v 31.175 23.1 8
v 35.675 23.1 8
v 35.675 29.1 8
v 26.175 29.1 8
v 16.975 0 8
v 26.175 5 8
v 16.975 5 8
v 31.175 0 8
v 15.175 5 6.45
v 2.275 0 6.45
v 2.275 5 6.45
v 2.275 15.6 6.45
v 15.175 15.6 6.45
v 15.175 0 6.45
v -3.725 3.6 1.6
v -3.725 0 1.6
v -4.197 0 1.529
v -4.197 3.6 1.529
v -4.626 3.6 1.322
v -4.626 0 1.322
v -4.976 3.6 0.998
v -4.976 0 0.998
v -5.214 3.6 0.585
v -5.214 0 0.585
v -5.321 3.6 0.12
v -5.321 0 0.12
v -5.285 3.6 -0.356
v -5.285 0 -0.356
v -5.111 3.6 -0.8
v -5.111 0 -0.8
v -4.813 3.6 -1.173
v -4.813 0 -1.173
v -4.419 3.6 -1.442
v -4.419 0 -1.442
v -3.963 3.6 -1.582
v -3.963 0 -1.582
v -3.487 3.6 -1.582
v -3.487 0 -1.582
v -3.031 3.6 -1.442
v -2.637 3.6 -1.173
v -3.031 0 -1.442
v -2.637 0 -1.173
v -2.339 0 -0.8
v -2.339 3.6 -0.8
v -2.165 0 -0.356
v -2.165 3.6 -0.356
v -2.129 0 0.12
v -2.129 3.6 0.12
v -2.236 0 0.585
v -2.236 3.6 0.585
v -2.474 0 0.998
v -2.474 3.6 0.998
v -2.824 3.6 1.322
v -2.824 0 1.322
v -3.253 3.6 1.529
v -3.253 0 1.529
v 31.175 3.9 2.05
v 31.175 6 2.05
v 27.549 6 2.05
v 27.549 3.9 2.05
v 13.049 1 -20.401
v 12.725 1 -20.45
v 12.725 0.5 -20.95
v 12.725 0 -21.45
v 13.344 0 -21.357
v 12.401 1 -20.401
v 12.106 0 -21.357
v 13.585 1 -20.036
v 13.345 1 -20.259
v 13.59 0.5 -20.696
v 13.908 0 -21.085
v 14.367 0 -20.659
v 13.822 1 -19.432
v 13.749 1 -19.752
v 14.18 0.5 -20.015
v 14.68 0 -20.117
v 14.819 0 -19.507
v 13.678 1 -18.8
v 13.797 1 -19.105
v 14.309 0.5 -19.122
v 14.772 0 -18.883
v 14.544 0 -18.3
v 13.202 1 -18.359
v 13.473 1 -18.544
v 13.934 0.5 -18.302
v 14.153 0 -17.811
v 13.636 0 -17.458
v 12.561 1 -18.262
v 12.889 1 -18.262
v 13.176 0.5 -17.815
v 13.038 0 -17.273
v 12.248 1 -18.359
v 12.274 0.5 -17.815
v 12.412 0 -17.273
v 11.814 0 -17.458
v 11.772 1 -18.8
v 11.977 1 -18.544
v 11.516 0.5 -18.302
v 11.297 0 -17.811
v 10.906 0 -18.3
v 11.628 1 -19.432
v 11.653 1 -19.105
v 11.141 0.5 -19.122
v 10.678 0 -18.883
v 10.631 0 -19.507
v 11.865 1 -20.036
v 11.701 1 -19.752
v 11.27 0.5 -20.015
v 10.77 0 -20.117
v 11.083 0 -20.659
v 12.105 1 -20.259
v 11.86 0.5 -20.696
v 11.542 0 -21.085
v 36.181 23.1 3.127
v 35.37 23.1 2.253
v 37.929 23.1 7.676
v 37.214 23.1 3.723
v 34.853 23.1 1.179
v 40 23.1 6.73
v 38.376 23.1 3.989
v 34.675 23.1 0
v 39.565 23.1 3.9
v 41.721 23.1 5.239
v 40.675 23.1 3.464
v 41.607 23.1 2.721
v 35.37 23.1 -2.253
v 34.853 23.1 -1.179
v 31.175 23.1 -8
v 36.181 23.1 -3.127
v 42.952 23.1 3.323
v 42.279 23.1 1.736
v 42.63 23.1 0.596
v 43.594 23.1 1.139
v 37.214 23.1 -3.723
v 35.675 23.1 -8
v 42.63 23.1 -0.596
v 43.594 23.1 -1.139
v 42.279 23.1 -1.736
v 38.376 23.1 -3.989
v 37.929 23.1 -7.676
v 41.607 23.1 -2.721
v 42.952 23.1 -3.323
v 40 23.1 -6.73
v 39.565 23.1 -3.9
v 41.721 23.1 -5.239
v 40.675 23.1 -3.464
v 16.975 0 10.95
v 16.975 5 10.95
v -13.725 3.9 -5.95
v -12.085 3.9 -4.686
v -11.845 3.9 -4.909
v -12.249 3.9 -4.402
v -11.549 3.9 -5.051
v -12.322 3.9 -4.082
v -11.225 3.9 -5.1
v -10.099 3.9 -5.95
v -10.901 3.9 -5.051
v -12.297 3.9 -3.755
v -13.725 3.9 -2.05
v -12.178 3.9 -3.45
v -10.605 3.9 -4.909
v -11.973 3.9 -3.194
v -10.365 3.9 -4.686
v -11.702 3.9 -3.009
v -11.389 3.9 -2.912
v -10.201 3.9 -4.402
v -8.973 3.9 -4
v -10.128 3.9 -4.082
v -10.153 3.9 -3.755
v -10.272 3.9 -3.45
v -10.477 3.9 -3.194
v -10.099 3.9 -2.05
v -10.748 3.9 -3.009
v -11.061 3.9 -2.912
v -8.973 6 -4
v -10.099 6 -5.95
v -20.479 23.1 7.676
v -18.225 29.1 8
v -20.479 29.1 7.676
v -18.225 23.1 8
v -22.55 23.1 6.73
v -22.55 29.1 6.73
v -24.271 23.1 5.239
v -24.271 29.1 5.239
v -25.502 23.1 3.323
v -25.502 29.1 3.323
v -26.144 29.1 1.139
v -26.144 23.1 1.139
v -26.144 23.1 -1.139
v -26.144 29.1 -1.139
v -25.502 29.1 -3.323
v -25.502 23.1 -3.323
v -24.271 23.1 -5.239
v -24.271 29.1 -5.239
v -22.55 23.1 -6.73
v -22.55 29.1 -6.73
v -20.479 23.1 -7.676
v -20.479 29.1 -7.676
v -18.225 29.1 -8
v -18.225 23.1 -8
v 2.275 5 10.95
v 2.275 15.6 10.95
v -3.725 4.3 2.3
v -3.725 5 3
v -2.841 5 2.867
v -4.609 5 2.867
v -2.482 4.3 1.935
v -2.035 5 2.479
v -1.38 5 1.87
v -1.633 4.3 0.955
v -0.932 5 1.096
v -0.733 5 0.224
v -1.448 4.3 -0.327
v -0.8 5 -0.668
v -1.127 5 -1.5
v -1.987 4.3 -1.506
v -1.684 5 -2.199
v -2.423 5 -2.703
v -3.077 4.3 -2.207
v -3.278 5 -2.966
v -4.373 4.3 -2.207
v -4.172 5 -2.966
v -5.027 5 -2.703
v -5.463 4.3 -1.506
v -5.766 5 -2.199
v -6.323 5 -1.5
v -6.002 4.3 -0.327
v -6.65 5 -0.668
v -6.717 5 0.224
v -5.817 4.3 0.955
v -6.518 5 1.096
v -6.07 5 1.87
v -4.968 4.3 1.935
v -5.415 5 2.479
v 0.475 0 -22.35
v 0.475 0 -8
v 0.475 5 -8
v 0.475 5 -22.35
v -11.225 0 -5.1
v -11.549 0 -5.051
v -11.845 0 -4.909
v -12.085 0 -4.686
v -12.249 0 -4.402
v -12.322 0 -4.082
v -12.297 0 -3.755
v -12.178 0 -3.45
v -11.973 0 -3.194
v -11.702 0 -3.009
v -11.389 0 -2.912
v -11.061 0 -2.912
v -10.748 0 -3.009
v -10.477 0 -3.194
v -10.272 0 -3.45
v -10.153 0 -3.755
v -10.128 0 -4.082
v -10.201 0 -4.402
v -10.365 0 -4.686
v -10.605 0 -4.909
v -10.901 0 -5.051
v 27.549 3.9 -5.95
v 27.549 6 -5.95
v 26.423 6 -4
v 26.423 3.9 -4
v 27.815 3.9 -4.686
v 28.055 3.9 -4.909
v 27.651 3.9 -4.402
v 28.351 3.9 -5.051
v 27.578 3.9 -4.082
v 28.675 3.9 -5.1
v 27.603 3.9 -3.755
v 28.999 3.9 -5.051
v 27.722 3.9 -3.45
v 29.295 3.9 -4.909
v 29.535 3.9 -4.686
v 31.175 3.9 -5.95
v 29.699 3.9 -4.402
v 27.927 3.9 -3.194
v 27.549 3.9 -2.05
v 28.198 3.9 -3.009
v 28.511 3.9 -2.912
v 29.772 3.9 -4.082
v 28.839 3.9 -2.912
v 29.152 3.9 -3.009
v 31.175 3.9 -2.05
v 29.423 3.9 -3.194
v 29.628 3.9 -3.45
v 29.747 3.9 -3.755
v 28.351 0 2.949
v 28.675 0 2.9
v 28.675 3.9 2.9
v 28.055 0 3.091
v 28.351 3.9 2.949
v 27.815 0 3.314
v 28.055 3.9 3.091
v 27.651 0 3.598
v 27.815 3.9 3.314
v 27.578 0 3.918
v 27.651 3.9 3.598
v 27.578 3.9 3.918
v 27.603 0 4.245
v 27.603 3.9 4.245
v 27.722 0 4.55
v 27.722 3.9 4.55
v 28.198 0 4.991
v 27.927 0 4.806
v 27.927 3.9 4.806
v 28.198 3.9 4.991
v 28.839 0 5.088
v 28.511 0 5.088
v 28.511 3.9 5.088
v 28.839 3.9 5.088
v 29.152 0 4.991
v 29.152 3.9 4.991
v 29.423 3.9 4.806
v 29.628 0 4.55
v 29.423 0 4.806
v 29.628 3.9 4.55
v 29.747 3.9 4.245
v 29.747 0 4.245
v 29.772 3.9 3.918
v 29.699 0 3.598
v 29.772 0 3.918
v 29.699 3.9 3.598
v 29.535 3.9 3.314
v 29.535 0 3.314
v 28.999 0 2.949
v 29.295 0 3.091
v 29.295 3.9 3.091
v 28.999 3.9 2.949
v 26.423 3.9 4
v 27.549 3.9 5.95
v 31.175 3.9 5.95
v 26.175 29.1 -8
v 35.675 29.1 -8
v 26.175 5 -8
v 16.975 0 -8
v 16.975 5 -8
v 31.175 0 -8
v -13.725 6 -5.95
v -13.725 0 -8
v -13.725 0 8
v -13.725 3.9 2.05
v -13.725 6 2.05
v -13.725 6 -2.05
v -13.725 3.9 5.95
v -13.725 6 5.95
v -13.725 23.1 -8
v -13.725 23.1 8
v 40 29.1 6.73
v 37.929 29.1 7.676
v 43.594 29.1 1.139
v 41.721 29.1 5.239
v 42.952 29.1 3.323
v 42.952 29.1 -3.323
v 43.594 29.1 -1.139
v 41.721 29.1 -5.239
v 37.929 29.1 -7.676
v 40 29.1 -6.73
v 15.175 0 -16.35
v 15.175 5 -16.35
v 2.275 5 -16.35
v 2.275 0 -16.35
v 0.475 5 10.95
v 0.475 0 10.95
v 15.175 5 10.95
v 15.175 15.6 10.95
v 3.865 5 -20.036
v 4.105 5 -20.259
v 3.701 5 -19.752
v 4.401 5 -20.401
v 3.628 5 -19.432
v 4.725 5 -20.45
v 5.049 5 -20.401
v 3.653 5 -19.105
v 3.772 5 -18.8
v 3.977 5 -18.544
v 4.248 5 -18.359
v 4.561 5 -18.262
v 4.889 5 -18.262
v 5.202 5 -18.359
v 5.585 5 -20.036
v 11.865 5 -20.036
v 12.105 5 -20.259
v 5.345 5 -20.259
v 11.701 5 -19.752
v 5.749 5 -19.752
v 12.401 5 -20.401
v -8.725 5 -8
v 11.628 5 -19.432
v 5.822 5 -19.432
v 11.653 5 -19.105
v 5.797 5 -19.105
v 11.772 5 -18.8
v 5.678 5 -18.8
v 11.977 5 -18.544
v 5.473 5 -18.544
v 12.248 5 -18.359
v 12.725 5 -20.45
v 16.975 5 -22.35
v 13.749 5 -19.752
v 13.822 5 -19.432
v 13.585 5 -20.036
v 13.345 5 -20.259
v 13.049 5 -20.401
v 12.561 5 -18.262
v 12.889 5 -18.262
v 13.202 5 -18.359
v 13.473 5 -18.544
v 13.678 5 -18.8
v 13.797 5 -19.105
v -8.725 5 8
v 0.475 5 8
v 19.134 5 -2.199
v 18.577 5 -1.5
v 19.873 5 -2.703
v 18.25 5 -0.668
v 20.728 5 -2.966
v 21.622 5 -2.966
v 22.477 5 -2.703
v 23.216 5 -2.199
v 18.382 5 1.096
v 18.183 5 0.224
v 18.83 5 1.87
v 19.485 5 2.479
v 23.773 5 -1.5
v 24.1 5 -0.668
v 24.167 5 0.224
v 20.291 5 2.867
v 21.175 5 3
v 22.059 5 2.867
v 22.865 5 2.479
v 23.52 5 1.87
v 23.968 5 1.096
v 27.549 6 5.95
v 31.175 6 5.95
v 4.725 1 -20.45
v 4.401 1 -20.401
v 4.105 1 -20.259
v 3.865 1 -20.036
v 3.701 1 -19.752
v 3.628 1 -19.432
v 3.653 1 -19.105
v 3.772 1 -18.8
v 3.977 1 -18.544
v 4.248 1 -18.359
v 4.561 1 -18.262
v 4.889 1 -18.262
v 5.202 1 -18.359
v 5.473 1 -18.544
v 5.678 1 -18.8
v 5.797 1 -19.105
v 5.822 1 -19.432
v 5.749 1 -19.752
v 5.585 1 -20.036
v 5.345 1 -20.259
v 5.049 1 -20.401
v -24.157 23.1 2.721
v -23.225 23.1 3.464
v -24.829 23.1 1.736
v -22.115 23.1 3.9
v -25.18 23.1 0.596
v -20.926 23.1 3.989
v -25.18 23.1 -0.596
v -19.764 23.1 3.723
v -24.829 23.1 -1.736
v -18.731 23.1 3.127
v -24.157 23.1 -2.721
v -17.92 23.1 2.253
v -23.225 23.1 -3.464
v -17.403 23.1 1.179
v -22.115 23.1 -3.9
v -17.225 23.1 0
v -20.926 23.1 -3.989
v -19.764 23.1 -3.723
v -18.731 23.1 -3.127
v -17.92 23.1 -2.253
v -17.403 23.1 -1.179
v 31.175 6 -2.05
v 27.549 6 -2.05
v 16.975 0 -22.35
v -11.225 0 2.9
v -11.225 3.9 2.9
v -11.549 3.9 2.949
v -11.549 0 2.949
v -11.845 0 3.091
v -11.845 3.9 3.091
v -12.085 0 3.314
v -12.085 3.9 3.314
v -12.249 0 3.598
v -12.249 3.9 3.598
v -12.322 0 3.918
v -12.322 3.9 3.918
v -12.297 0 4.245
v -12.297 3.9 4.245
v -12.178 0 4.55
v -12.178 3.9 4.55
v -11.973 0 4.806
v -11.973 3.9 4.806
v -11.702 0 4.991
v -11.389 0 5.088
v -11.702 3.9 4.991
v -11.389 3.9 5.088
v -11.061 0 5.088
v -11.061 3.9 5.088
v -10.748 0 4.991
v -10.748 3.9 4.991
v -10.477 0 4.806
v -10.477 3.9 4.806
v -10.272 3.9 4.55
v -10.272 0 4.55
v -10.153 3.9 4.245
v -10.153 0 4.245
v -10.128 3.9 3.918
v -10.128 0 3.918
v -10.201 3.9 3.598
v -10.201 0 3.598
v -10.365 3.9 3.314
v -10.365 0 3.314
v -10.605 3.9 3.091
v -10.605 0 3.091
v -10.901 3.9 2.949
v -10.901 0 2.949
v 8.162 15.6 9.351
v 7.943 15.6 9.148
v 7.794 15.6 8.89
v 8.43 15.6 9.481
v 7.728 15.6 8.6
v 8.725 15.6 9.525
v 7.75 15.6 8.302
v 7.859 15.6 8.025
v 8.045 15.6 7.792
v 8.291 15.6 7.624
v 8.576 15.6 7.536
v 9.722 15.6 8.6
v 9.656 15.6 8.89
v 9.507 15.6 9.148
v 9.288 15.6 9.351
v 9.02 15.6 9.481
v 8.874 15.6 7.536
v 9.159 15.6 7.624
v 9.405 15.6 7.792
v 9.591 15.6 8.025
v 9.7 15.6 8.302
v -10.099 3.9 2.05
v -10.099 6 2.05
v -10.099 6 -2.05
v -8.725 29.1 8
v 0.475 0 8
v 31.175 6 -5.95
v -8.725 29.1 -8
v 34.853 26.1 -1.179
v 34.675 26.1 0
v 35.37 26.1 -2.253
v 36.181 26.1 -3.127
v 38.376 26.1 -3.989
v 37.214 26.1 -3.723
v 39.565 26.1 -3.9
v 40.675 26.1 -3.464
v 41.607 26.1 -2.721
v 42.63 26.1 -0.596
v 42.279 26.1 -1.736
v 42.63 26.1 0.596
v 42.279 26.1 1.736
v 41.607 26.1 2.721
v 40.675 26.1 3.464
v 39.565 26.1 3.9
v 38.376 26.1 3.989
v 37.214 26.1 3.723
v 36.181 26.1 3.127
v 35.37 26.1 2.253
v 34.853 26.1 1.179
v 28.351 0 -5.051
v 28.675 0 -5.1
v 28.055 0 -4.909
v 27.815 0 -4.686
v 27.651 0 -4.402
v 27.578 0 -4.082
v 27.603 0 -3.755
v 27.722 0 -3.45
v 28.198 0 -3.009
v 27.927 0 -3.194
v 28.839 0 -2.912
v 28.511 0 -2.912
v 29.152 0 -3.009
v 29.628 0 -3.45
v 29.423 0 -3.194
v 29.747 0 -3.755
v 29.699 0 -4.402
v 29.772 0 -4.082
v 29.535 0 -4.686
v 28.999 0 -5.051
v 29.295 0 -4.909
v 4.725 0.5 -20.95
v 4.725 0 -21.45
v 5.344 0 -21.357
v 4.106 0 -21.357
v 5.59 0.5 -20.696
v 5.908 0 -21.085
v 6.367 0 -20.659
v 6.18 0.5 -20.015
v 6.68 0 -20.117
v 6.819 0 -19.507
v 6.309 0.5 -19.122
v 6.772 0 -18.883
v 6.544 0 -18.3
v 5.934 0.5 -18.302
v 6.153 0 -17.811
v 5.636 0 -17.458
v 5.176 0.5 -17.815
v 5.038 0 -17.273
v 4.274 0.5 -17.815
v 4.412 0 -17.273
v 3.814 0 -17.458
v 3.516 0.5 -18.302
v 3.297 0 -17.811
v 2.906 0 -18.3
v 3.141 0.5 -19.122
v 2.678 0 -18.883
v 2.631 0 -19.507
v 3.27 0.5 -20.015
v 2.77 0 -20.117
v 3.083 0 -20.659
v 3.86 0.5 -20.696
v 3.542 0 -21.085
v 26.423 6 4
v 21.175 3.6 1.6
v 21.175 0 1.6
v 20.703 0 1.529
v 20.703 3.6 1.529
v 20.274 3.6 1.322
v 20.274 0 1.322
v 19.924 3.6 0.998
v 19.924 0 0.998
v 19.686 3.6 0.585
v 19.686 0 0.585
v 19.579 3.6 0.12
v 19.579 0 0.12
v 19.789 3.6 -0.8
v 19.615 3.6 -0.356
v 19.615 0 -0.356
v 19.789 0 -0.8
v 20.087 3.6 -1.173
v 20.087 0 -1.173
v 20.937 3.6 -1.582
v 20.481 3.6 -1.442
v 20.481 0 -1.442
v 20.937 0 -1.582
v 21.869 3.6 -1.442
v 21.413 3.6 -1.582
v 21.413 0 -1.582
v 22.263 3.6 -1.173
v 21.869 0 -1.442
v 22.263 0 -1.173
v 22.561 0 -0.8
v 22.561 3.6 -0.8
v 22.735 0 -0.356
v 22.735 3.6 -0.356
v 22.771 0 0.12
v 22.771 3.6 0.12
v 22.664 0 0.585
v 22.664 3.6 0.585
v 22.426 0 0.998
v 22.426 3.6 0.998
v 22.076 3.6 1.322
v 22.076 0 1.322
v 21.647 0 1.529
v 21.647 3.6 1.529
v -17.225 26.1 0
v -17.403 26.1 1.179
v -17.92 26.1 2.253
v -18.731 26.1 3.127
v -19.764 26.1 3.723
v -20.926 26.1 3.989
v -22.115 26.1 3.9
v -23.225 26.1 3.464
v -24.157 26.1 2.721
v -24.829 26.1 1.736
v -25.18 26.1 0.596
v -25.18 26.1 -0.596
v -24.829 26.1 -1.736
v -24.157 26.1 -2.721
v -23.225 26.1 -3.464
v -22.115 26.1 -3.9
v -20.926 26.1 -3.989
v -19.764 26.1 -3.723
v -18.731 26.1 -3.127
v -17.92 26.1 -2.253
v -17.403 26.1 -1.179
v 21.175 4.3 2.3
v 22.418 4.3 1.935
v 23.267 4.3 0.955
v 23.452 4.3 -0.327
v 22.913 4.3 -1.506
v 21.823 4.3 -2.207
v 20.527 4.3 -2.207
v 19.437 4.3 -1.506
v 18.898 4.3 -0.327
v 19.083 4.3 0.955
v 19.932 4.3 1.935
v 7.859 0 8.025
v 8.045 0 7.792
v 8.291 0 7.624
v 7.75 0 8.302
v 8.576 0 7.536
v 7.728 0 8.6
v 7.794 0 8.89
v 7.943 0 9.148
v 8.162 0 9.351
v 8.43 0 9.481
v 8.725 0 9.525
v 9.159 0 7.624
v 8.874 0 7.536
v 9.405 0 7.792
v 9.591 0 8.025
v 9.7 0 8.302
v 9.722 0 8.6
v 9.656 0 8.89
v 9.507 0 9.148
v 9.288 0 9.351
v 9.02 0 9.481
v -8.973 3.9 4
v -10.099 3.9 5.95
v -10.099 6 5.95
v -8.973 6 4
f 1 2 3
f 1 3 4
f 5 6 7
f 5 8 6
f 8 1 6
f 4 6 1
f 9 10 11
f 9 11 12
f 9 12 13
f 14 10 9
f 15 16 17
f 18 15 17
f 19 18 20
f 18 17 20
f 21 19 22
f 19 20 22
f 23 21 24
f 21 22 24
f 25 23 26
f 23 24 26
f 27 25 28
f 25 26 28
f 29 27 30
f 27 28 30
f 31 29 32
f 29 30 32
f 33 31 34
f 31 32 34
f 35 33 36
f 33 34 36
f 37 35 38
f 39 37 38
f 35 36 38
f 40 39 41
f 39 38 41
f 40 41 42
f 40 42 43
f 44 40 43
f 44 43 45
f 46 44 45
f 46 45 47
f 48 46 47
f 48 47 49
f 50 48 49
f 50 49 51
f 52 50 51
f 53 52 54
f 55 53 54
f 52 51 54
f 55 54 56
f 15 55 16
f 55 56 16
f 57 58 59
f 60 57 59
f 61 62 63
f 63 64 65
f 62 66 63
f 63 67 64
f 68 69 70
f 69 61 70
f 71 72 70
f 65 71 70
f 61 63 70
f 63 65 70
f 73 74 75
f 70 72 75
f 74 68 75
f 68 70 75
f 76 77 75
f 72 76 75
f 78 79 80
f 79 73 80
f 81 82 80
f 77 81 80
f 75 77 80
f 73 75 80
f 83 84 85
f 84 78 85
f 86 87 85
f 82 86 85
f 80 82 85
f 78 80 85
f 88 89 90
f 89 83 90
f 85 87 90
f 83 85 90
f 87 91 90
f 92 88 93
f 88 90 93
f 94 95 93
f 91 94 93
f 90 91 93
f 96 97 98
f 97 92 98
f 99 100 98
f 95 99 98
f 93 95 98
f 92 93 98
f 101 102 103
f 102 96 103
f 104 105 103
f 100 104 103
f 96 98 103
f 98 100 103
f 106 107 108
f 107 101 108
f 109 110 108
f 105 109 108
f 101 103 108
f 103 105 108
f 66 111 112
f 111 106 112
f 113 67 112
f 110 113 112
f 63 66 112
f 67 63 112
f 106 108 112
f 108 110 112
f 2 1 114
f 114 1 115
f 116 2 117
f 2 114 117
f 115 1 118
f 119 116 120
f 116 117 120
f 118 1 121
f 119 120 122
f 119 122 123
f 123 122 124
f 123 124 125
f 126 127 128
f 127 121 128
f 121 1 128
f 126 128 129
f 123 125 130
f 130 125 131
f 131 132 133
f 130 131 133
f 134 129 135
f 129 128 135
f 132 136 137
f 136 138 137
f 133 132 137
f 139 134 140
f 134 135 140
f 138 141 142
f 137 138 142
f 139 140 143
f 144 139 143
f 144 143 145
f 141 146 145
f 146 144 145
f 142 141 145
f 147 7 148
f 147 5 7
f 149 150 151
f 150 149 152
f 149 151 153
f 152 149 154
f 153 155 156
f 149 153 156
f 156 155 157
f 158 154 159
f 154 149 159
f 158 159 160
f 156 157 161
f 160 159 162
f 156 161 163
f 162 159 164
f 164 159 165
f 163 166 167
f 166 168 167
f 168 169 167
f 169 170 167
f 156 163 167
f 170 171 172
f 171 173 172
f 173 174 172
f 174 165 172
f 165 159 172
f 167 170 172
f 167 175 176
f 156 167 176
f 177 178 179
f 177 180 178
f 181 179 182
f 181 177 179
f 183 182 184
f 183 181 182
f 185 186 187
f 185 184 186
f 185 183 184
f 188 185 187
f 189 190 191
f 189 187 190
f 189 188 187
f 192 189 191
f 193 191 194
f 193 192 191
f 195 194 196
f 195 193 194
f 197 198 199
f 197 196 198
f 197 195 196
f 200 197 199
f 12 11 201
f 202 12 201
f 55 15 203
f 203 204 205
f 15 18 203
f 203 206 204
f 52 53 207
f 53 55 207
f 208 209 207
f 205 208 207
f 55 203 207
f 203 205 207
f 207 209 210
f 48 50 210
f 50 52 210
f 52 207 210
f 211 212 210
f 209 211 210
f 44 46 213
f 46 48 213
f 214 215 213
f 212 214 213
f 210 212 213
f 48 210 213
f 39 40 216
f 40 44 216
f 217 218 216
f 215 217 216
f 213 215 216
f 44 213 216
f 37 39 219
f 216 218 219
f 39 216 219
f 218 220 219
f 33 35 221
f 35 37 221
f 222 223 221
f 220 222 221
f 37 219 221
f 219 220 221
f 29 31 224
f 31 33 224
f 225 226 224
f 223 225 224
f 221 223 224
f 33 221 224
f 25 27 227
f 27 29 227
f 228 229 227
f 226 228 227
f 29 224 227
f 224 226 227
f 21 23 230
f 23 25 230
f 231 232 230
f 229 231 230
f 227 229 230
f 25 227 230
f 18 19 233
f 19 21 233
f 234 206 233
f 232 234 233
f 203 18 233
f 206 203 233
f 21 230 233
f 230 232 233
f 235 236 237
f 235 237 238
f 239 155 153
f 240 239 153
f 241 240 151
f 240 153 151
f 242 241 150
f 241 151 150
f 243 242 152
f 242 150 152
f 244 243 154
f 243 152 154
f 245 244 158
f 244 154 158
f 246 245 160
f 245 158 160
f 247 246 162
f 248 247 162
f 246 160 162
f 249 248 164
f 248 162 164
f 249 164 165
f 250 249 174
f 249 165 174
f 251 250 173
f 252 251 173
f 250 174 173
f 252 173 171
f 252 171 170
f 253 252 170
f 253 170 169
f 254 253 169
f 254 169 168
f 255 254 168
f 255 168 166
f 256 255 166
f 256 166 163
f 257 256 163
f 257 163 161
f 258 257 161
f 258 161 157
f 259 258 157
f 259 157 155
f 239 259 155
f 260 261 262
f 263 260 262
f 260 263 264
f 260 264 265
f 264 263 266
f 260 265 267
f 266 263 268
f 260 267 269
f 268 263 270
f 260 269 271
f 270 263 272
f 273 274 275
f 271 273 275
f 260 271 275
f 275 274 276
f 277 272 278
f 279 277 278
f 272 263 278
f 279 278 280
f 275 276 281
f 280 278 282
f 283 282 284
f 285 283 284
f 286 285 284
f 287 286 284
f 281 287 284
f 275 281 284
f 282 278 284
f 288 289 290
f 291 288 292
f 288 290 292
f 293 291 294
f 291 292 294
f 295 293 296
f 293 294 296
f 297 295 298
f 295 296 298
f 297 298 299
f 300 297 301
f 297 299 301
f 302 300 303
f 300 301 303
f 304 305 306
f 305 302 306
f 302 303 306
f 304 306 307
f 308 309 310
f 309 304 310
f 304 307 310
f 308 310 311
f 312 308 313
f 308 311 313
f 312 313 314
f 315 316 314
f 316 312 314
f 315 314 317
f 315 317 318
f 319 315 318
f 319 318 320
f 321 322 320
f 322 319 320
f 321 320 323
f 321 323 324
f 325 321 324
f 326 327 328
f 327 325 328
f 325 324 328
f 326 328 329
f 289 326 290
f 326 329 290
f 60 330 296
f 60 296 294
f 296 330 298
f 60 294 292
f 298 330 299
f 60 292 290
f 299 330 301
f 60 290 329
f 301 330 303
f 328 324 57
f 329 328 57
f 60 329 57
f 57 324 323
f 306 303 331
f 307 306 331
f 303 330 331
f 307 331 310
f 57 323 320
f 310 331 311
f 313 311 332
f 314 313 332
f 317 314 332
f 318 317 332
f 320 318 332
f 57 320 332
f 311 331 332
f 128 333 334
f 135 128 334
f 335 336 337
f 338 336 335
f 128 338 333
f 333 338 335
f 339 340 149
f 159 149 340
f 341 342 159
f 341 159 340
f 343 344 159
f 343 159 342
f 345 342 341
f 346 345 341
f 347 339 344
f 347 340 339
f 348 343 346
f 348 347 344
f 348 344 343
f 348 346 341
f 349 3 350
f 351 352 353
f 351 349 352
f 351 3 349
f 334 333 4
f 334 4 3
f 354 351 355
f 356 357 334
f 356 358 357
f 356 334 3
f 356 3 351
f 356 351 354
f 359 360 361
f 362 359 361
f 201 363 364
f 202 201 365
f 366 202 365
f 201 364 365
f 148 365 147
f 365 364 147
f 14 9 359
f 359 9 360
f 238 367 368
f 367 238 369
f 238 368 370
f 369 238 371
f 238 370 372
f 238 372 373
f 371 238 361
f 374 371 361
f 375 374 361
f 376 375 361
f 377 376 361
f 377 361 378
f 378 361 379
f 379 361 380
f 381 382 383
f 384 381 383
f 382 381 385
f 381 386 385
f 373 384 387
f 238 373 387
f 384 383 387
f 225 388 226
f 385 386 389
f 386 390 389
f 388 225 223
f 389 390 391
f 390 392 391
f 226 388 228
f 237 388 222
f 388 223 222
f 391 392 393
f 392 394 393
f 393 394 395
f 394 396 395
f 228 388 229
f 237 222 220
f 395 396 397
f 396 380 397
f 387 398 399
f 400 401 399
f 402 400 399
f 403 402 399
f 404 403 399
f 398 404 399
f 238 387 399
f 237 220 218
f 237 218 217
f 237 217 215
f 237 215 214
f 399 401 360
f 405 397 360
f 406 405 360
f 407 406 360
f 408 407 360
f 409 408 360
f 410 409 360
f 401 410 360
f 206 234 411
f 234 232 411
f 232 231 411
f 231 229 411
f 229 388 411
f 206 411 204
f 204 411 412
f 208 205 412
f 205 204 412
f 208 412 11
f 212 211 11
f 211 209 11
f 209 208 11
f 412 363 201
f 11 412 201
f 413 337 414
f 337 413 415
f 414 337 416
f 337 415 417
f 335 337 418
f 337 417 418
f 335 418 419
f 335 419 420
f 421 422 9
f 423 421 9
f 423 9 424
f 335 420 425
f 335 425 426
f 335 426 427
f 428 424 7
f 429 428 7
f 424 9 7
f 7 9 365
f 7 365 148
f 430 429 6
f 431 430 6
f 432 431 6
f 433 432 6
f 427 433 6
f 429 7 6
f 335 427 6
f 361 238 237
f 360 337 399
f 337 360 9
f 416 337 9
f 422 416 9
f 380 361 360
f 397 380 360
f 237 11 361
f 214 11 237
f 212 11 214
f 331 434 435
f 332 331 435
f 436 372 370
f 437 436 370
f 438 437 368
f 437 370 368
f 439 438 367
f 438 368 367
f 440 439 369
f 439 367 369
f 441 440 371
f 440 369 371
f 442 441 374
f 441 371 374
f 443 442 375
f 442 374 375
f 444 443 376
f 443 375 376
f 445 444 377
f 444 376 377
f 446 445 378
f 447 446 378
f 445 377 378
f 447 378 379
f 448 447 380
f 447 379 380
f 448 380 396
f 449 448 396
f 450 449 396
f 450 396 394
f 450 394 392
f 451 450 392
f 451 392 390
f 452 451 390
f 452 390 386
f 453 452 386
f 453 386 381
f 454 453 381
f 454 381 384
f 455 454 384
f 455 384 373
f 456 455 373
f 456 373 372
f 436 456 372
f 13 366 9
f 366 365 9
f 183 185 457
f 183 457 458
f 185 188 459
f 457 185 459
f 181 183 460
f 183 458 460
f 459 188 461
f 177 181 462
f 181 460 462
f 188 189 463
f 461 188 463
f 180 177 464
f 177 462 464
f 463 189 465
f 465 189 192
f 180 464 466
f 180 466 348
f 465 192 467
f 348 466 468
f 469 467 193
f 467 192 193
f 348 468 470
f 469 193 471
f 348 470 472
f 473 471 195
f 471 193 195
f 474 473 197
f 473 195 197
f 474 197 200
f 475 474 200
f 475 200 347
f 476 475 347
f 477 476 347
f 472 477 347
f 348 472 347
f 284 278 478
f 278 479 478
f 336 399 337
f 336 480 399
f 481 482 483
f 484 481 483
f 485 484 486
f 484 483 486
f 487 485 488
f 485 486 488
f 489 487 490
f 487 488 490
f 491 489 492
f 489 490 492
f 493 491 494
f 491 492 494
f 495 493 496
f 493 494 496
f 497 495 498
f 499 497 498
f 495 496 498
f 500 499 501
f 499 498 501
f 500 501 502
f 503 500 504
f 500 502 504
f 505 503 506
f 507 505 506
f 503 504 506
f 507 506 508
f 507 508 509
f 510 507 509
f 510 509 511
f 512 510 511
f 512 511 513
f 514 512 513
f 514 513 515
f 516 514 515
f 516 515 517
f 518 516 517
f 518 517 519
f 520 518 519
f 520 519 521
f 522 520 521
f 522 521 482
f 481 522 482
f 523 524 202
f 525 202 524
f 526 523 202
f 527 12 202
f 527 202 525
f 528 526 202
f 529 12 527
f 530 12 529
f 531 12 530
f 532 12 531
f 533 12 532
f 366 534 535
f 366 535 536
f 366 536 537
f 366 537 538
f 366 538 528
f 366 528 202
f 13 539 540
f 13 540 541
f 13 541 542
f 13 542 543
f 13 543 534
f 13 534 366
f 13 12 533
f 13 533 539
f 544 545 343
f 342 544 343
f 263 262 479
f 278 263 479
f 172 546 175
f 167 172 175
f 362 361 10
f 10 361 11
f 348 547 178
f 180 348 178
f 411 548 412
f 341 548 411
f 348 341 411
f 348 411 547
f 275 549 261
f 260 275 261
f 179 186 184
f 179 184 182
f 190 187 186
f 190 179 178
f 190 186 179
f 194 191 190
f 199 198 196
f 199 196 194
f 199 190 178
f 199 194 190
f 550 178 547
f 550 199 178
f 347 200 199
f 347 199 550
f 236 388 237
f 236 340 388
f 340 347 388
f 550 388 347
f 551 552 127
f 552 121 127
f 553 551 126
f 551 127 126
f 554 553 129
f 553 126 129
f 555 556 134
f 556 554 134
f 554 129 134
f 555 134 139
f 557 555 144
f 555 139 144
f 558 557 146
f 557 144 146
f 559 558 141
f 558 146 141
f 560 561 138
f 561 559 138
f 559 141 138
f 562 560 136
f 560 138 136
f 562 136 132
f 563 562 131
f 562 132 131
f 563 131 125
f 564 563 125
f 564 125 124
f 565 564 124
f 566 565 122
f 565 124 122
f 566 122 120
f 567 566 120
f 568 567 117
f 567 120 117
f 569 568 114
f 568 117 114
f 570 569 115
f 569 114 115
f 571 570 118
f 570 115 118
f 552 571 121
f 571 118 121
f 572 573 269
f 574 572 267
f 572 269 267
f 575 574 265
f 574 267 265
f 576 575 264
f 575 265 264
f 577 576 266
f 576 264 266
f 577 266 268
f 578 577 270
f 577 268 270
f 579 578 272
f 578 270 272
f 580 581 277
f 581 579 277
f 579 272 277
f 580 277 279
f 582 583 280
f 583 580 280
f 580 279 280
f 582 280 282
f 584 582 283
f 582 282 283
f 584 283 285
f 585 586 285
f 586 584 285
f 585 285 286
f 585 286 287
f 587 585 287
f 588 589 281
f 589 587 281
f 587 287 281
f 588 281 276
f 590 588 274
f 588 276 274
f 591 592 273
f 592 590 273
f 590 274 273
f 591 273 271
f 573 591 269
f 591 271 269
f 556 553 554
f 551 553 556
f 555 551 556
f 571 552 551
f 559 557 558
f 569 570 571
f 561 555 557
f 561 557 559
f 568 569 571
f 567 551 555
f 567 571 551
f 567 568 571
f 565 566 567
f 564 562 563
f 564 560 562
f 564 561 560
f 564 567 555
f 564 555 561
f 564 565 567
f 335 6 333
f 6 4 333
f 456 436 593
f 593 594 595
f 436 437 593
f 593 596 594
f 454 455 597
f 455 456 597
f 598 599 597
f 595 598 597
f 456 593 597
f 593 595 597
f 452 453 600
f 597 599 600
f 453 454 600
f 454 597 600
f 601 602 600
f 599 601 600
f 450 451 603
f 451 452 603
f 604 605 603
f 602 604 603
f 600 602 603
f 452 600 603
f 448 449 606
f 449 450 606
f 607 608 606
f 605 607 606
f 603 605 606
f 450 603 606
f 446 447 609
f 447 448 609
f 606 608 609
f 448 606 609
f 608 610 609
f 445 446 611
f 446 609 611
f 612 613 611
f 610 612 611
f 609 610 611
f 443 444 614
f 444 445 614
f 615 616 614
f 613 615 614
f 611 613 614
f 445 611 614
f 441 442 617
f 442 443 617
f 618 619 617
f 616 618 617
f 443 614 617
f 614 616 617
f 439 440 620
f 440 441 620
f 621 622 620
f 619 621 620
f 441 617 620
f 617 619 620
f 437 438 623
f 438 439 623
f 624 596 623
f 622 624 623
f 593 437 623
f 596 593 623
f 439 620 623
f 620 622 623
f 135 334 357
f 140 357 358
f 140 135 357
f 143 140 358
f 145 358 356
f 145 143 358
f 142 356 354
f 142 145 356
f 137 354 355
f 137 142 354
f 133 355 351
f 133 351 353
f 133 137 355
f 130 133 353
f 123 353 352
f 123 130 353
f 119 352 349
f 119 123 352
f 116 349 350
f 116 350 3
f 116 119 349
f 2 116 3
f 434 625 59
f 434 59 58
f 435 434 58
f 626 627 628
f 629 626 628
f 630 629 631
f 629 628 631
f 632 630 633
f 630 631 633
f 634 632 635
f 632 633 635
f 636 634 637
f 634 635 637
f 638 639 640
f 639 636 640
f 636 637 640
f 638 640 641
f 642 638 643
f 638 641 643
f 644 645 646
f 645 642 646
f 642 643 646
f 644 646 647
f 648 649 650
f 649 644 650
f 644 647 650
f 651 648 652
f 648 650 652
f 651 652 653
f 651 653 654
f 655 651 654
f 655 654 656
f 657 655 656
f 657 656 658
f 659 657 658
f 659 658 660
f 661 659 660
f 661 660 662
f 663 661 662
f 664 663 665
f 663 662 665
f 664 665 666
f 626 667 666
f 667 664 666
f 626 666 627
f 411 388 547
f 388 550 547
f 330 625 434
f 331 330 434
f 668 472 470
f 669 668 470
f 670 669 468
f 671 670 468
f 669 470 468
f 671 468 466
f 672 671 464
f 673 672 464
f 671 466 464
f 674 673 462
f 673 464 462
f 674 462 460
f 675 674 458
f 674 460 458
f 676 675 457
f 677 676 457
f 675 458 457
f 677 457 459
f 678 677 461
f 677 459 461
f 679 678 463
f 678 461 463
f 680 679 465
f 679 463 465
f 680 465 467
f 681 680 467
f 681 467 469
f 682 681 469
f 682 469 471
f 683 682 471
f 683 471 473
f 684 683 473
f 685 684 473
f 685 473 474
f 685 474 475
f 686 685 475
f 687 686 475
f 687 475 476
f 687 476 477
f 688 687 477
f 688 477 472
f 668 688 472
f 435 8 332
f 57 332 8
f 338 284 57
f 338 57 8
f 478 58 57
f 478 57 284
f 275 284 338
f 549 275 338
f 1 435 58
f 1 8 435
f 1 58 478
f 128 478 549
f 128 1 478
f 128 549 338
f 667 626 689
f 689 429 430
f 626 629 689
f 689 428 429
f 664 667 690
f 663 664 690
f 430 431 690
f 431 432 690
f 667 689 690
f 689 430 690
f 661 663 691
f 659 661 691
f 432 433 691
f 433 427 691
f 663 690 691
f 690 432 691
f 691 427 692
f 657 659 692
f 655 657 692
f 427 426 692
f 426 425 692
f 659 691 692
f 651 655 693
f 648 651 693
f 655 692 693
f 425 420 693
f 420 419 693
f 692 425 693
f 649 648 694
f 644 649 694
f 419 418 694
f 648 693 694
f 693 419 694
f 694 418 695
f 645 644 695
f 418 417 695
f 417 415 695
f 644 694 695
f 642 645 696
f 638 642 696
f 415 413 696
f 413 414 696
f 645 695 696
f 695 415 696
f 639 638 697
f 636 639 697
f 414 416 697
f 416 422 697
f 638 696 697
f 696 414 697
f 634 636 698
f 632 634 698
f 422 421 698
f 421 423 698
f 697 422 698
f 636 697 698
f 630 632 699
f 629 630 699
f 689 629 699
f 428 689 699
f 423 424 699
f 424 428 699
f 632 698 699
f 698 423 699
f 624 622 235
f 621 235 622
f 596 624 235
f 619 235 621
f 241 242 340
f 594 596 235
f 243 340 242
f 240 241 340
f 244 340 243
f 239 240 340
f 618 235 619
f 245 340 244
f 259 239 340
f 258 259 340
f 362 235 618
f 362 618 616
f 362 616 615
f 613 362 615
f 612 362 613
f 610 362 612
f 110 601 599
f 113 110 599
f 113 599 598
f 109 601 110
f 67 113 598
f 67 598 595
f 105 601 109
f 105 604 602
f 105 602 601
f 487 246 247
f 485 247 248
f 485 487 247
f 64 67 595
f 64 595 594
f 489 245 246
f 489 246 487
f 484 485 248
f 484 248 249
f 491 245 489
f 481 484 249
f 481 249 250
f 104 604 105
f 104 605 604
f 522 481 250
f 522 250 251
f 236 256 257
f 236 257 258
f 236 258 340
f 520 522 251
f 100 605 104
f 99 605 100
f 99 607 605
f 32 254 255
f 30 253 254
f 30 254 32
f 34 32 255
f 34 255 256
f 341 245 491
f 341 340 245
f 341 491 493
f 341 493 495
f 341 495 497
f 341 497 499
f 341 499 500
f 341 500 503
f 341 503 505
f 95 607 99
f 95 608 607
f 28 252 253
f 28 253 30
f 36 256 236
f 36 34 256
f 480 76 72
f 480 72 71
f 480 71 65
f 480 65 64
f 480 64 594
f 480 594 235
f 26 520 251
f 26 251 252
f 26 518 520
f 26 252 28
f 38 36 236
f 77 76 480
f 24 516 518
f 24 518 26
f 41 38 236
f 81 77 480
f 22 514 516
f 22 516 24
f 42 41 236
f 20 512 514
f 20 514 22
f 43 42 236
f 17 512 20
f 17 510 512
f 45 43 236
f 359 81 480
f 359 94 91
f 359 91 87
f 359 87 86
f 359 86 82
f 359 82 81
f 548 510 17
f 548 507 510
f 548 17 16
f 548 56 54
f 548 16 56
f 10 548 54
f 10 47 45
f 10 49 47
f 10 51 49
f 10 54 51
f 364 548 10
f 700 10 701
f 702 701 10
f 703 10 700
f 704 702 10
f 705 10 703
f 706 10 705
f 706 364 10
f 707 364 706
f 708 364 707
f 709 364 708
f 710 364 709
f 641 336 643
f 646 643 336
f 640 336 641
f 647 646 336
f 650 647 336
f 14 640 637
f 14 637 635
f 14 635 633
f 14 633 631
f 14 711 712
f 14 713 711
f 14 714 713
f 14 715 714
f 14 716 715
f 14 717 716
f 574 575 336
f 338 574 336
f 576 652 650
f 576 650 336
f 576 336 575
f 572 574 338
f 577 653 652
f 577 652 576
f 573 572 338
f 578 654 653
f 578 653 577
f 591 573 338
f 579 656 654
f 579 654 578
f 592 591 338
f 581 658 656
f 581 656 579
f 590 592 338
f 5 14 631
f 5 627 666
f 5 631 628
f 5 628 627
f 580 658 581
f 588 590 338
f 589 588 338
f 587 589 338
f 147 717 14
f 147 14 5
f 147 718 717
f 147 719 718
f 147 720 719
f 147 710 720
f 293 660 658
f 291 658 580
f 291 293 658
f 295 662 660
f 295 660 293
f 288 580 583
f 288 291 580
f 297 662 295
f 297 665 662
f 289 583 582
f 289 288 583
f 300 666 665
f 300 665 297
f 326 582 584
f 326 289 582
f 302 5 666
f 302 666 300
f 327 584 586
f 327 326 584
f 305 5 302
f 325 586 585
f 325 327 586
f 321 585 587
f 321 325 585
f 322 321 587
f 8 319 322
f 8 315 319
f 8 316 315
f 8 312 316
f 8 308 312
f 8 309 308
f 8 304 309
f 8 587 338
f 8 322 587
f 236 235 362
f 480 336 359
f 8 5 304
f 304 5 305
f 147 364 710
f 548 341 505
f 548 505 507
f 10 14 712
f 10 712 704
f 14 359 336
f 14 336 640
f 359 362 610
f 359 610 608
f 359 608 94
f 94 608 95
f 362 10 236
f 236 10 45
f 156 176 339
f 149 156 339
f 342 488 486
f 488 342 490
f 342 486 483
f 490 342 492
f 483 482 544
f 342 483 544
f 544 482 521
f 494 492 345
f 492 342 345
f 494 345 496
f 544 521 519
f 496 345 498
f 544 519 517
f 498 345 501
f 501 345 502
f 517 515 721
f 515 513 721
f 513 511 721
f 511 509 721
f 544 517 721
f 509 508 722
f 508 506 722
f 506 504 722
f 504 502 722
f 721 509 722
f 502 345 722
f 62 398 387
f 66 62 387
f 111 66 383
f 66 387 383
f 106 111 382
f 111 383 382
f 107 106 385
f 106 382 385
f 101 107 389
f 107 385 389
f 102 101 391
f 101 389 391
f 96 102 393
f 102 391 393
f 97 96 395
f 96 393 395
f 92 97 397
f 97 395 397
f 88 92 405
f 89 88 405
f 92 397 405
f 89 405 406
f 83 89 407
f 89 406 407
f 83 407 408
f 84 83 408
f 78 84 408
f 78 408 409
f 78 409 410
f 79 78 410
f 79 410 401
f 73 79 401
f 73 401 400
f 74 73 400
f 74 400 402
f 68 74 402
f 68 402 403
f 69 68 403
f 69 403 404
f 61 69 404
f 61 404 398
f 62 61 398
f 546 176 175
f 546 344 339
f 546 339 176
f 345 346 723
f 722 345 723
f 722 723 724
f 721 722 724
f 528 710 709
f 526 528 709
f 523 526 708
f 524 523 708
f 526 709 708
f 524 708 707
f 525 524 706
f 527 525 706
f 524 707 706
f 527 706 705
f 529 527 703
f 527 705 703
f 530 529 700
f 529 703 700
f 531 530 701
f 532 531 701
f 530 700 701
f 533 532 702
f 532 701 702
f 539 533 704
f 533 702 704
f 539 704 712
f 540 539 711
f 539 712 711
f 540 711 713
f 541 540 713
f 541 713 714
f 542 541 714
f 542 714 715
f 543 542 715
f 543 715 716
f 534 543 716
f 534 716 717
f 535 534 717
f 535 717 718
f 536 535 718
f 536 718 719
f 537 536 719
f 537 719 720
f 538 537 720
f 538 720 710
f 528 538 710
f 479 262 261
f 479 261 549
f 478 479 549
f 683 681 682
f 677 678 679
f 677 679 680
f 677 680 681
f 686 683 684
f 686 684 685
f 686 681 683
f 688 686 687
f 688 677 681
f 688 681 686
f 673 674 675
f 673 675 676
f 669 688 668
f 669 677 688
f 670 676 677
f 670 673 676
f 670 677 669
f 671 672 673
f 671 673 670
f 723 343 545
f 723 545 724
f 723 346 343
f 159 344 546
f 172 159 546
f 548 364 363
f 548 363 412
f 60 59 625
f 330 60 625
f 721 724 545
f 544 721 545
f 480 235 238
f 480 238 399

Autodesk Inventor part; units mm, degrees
ref_plane "YZ Plane" through (0, 0, 0) normal (1, 0, 0) x (0, 1, 0)
ref_plane "XZ Plane" through (0, 0, 0) normal (0, 1, 0) x (-1, 0, 0)
ref_plane "XY Plane" through (0, 0, 0) normal (0, 0, 1) x (1, 0, 0)
sketch "Эскиз1" plane through (0, 0, 0) normal (0, 1, 0) x (-1, 0, 0)
  line L0 (-8.725, 8) -> (8.725, 8)
  line L1 (8.725, 8) -> (8.725, -8)
  line L2 (8.725, -8) -> (-8.725, -8)
  line L3 (-8.725, -8) -> (-8.725, 8)
  line L4 (-8.725, 8) -> (8.725, -8) construction
  line L5 (8.725, 8) -> (-8.725, -8) construction
  point P0 (0, 0)
  dimension "d0" = 17.45
  dimension "d1" = 16
extrude "Выдавливание1" add sketch "Эскиз1" along normal blind 5
sketch "Эскиз2" plane through (-8.725, 0, -8) normal (-1, 0, 0) x (0, 0, 1)
  line L0 (0, 23.1) -> (16, 23.1)
  line L1 (16, 23.1) -> (16, 0)
  line L2 (16, 0) -> (0, 0)
  line L3 (0, 0) -> (0, 23.1)
  line L4 (16, 0) -> (16, 5) projected
  line L5 (0, 0) -> (0, 5) projected
  line L6 (0, 0) -> (16, 0) projected
  line L7 (0, 5) -> (16, 5) projected
  point P0 (8, 0)
  dimension "d5" = 18.1
extrude "Выдавливание2" add sketch "Эскиз2" along normal blind 5
sketch "Эскиз3" plane through (-8.725, 23.1, 8) normal (0, 1, 0) x (1, 0, 0)
  line L0 (0, 16) -> (-17.5, 16)
  line L1 (-17.5, 16) -> (-17.5, 0)
  line L2 (-17.5, 0) -> (0, 0)
  line L3 (0, 0) -> (0, 16)
  line L4 (0, 0) -> (-5, 0) projected
  circle A0 centre (-9.5, 8) radius 8
  line L5 (-5, 0) -> (-5, 16) projected
  point P0 (-9.5, 16)
  point P1 (-9.5, 0)
  point P2 (-5, 8)
  dimension "d49" = 4.5
extrude "Выдавливание3" add sketch "Эскиз3" along normal blind 6 contours L3 L2 L5 A0 L0 | L5 A0 L0 | A0 L5 | A0 L5 | L2 A0 L5
sketch "Эскиз7" plane through (0, 0, 0) normal (0, -1, 0) x (1, 0, 0)
  line L0 (-8.725, -8) -> (-8.725, 8) construction
  line L1 (-8.725, 8) -> (-8.725, -8) construction
  line L2 (-13.725, 8) -> (-13.725, -8) construction
  line L3 (-8.725, -8) -> (-13.725, -8) construction
  line L4 (-13.725, -8) -> (-13.725, 8) construction
  line L5 (-13.725, 8) -> (-8.725, 8) construction
  line L6 (-8.725, 8) -> (-8.725, -8) construction
  line L7 (-13.725, -8) -> (-13.725, 8) projected
  line L8 (-13.725, 0) -> (-8.725, 0) construction
  line L9 (-11.225, -4) -> (-11.225, 4)
  point P0 (0, 0)
  point P1 (-11.225, 0)
  dimension "d34" = 8
hole "Отверстие3" at (-11.225, 0, -4) at (-11.225, 0, 4) direction (0, 1, 0) diameter 2.2 depth 6
sketch "Эскиз8" plane through (0, 0, 0) normal (0, -1, 0) x (1, 0, 0)
  circle A0 centre (-11.225, -4) radius 1.1 projected
  line L0 (-13.4767, -4) -> (-12.3508, -2.05) construction
  line L1 (-12.3508, -2.05) -> (-10.0992, -2.05)
  line L2 (-10.0992, -2.05) -> (-8.9733, -4)
  line L3 (-8.9733, -4) -> (-10.0992, -5.95)
  line L4 (-10.0992, -5.95) -> (-12.3508, -5.95)
  line L5 (-12.3508, -5.95) -> (-13.4767, -4) construction
  circle A1 centre (-11.225, 4) radius 1.1 projected
  line L6 (-13.4767, 4) -> (-12.3508, 5.95) construction
  line L7 (-12.3508, 5.95) -> (-10.0992, 5.95)
  line L8 (-10.0992, 5.95) -> (-8.9733, 4)
  line L9 (-8.9733, 4) -> (-10.0992, 2.05)
  line L10 (-10.0992, 2.05) -> (-12.3508, 2.05)
  line L11 (-12.3508, 2.05) -> (-13.4767, 4) construction
  line L12 (-13.725, -8) -> (-13.725, 8) projected
  line L13 (-12.3508, -5.95) -> (-13.725, -5.95)
  line L14 (-13.725, -5.95) -> (-13.725, -2.05)
  line L15 (-13.725, -2.05) -> (-12.3508, -2.05)
  line L16 (-12.3508, -2.05) -> (-12.3508, -5.95) construction
  line L17 (-12.3508, 2.05) -> (-13.725, 2.05)
  line L18 (-13.725, 2.05) -> (-13.725, 5.95)
  line L19 (-13.725, 5.95) -> (-12.3508, 5.95)
  line L20 (-12.3508, 5.95) -> (-12.3508, 2.05) construction
  point P0 (0, 0)
  dimension "d42" = 3.9
extrude "Выдавливание5" cut sketch "Эскиз8" along normal blind 2.1 from surface at -6
sketch "Эскиз4" plane through (-8.725, 23.1, 8) normal (0, -1, 0) x (1, 0, 0)
  arc A0 (-9.5, 0) -> (-9.5, -16) centre (-9.5, -8) ccw projected
  circle A1 centre (-12.5, -8) radius 4
  arc A2 (-9.5, 0) -> (-9.5, -16) centre (-9.5, -8) ccw projected
  line L0 (-17.5, -8) -> (-16.5, -8) construction
  line L1 (-16.5, -8) -> (-9.5, -8) construction
  point P0 (8.725, -8)
  dimension "d45" = 8
  dimension "d46" = 1
extrude "Выдавливание6" cut sketch "Эскиз4" against normal blind 3
sketch "Эскиз5" plane through (0, 5, 0) normal (0, 1, 0) x (1, 0, 0)
  line L0 (-8.725, 8) -> (-8.725, -8) projected
  line L1 (-8.725, 0) -> (-3.725, 0) construction
  point P0 (0, 0)
  dimension "d22" = 5
hole "Отверстие2" at (-3.725, 5, 0) direction (0, -1, 0) diameter 3.2 end through all countersink diameter 6 countersink angle 90
mirror "Зеркальное отражение1" about plane through (8.725, 0, 8) normal (1, 0, 0)
sketch "Эскиз9" plane through (0, 0, 0) normal (0, -1, 0) x (1, 0, 0)
  line L0 (-8.725, 8) -> (26.175, 8) construction
  line L1 (8.725, 8) -> (8.725, -8) construction
  line L2 (-8.725, -8) -> (26.175, -8) construction
  line L3 (2.475, -16.35) -> (14.975, -16.35) construction
  line L4 (14.975, -16.35) -> (14.975, 6.45) construction
  line L5 (14.975, 6.45) -> (2.475, 6.45) construction
  line L6 (2.475, 6.45) -> (2.475, -16.35) construction
  line L7 (2.475, -16.35) -> (14.975, 6.45) construction
  line L8 (14.975, -16.35) -> (2.475, 6.45) construction
  line L9 (16.975, 10.95) -> (0.475, 10.95)
  line L10 (0.475, 10.95) -> (0.475, -22.35)
  line L11 (0.475, -22.35) -> (16.975, -22.35)
  line L12 (16.975, -22.35) -> (16.975, 10.95)
  point P0 (0, 0)
  point P1 (8.725, -4.95)
  point P2 (8.725, 0)
  dimension "d50" = 12.5
  dimension "d51" = 22.8
  dimension "d59" = 4.95
  dimension "d68" = 6
  dimension "d69" = 4.5
  dimension "d70" = 2
  dimension "d71" = 2
extrude "Выдавливание7" add sketch "Эскиз9" against normal up to surface (5 mm away)
sketch "Эскиз10" plane through (0, 5, 0) normal (0, 1, 0) x (1, 0, 0)
  line L0 (2.275, -6.45) -> (15.175, -6.45)
  line L1 (15.175, -6.45) -> (15.175, 16.35)
  line L2 (15.175, 16.35) -> (2.275, 16.35)
  line L3 (2.275, 16.35) -> (2.275, -6.45)
  line L4 (2.275, -6.45) -> (15.175, 16.35) construction
  line L5 (15.175, -6.45) -> (2.275, 16.35) construction
  line L6 (-8.725, 8) -> (0.475, 8) projected
  line L7 (16.975, -8) -> (0.475, 8) construction
  line L8 (16.975, 8) -> (26.175, 8) projected
  line L9 (-8.725, -8) -> (0.475, -8) projected
  line L10 (16.975, 8) -> (0.475, -8) construction
  line L11 (16.975, -8) -> (26.175, -8) projected
  line L12 (8.725, 0) -> (8.725, 4.95)
  point P0 (0, 0)
  dimension "d54" = 12.9
  dimension "d55" = 22.8
  dimension "d72" = 4.95
extrude "Выдавливание8" cut sketch "Эскиз10" against normal through all
sketch "Эскиз11" plane through (0, 0, 0) normal (0, -1, 0) x (1, 0, 0)
  line L0 (8.725, -22.35) -> (8.725, -16.35) construction
  line L1 (12.725, -19.35) -> (4.725, -19.35)
  line L2 (15.175, -16.35) -> (2.275, -16.35) projected
  line L3 (0.475, -22.35) -> (16.975, -22.35) projected
  point P0 (0, 0)
  point P1 (8.725, -19.35)
  dimension "d60" = 8
hole "Отверстие4" at (12.725, 0, -19.35) at (4.725, 0, -19.35) direction (0, 1, 0) diameter 2.2 end through all countersink diameter 4.2 countersink angle 90
sketch "Эскиз12" plane through (0, 5, 0) normal (0, 1, 0) x (1, 0, 0)
  line L0 (2.275, -6.45) -> (15.175, -6.45) projected
  line L1 (15.175, -6.45) -> (2.275, -6.45)
  line L2 (2.275, -6.45) -> (2.275, -10.95)
  line L3 (2.275, -10.95) -> (15.175, -10.95)
  line L4 (15.175, -10.95) -> (15.175, -6.45)
  line L5 (16.975, -10.95) -> (0.475, -10.95) projected
  point P0 (0, 0)
extrude "Выдавливание9" add sketch "Эскиз12" along normal blind 10.6
sketch "Эскиз13" plane through (0, 15.6, 0) normal (0, 1, 0) x (1, 0, 0)
  line L0 (8.725, -8.525) -> (8.725, -6.45) construction
  line L1 (2.275, -6.45) -> (15.175, -6.45) projected
  point P0 (0, 0)
  dimension "d82" = 2.075
hole "Отверстие5" at (8.725, 15.6, 8.525) direction (0, -1, 0) diameter 2 depth 6000 tip angle 118
properties part number "Basis of steering"
